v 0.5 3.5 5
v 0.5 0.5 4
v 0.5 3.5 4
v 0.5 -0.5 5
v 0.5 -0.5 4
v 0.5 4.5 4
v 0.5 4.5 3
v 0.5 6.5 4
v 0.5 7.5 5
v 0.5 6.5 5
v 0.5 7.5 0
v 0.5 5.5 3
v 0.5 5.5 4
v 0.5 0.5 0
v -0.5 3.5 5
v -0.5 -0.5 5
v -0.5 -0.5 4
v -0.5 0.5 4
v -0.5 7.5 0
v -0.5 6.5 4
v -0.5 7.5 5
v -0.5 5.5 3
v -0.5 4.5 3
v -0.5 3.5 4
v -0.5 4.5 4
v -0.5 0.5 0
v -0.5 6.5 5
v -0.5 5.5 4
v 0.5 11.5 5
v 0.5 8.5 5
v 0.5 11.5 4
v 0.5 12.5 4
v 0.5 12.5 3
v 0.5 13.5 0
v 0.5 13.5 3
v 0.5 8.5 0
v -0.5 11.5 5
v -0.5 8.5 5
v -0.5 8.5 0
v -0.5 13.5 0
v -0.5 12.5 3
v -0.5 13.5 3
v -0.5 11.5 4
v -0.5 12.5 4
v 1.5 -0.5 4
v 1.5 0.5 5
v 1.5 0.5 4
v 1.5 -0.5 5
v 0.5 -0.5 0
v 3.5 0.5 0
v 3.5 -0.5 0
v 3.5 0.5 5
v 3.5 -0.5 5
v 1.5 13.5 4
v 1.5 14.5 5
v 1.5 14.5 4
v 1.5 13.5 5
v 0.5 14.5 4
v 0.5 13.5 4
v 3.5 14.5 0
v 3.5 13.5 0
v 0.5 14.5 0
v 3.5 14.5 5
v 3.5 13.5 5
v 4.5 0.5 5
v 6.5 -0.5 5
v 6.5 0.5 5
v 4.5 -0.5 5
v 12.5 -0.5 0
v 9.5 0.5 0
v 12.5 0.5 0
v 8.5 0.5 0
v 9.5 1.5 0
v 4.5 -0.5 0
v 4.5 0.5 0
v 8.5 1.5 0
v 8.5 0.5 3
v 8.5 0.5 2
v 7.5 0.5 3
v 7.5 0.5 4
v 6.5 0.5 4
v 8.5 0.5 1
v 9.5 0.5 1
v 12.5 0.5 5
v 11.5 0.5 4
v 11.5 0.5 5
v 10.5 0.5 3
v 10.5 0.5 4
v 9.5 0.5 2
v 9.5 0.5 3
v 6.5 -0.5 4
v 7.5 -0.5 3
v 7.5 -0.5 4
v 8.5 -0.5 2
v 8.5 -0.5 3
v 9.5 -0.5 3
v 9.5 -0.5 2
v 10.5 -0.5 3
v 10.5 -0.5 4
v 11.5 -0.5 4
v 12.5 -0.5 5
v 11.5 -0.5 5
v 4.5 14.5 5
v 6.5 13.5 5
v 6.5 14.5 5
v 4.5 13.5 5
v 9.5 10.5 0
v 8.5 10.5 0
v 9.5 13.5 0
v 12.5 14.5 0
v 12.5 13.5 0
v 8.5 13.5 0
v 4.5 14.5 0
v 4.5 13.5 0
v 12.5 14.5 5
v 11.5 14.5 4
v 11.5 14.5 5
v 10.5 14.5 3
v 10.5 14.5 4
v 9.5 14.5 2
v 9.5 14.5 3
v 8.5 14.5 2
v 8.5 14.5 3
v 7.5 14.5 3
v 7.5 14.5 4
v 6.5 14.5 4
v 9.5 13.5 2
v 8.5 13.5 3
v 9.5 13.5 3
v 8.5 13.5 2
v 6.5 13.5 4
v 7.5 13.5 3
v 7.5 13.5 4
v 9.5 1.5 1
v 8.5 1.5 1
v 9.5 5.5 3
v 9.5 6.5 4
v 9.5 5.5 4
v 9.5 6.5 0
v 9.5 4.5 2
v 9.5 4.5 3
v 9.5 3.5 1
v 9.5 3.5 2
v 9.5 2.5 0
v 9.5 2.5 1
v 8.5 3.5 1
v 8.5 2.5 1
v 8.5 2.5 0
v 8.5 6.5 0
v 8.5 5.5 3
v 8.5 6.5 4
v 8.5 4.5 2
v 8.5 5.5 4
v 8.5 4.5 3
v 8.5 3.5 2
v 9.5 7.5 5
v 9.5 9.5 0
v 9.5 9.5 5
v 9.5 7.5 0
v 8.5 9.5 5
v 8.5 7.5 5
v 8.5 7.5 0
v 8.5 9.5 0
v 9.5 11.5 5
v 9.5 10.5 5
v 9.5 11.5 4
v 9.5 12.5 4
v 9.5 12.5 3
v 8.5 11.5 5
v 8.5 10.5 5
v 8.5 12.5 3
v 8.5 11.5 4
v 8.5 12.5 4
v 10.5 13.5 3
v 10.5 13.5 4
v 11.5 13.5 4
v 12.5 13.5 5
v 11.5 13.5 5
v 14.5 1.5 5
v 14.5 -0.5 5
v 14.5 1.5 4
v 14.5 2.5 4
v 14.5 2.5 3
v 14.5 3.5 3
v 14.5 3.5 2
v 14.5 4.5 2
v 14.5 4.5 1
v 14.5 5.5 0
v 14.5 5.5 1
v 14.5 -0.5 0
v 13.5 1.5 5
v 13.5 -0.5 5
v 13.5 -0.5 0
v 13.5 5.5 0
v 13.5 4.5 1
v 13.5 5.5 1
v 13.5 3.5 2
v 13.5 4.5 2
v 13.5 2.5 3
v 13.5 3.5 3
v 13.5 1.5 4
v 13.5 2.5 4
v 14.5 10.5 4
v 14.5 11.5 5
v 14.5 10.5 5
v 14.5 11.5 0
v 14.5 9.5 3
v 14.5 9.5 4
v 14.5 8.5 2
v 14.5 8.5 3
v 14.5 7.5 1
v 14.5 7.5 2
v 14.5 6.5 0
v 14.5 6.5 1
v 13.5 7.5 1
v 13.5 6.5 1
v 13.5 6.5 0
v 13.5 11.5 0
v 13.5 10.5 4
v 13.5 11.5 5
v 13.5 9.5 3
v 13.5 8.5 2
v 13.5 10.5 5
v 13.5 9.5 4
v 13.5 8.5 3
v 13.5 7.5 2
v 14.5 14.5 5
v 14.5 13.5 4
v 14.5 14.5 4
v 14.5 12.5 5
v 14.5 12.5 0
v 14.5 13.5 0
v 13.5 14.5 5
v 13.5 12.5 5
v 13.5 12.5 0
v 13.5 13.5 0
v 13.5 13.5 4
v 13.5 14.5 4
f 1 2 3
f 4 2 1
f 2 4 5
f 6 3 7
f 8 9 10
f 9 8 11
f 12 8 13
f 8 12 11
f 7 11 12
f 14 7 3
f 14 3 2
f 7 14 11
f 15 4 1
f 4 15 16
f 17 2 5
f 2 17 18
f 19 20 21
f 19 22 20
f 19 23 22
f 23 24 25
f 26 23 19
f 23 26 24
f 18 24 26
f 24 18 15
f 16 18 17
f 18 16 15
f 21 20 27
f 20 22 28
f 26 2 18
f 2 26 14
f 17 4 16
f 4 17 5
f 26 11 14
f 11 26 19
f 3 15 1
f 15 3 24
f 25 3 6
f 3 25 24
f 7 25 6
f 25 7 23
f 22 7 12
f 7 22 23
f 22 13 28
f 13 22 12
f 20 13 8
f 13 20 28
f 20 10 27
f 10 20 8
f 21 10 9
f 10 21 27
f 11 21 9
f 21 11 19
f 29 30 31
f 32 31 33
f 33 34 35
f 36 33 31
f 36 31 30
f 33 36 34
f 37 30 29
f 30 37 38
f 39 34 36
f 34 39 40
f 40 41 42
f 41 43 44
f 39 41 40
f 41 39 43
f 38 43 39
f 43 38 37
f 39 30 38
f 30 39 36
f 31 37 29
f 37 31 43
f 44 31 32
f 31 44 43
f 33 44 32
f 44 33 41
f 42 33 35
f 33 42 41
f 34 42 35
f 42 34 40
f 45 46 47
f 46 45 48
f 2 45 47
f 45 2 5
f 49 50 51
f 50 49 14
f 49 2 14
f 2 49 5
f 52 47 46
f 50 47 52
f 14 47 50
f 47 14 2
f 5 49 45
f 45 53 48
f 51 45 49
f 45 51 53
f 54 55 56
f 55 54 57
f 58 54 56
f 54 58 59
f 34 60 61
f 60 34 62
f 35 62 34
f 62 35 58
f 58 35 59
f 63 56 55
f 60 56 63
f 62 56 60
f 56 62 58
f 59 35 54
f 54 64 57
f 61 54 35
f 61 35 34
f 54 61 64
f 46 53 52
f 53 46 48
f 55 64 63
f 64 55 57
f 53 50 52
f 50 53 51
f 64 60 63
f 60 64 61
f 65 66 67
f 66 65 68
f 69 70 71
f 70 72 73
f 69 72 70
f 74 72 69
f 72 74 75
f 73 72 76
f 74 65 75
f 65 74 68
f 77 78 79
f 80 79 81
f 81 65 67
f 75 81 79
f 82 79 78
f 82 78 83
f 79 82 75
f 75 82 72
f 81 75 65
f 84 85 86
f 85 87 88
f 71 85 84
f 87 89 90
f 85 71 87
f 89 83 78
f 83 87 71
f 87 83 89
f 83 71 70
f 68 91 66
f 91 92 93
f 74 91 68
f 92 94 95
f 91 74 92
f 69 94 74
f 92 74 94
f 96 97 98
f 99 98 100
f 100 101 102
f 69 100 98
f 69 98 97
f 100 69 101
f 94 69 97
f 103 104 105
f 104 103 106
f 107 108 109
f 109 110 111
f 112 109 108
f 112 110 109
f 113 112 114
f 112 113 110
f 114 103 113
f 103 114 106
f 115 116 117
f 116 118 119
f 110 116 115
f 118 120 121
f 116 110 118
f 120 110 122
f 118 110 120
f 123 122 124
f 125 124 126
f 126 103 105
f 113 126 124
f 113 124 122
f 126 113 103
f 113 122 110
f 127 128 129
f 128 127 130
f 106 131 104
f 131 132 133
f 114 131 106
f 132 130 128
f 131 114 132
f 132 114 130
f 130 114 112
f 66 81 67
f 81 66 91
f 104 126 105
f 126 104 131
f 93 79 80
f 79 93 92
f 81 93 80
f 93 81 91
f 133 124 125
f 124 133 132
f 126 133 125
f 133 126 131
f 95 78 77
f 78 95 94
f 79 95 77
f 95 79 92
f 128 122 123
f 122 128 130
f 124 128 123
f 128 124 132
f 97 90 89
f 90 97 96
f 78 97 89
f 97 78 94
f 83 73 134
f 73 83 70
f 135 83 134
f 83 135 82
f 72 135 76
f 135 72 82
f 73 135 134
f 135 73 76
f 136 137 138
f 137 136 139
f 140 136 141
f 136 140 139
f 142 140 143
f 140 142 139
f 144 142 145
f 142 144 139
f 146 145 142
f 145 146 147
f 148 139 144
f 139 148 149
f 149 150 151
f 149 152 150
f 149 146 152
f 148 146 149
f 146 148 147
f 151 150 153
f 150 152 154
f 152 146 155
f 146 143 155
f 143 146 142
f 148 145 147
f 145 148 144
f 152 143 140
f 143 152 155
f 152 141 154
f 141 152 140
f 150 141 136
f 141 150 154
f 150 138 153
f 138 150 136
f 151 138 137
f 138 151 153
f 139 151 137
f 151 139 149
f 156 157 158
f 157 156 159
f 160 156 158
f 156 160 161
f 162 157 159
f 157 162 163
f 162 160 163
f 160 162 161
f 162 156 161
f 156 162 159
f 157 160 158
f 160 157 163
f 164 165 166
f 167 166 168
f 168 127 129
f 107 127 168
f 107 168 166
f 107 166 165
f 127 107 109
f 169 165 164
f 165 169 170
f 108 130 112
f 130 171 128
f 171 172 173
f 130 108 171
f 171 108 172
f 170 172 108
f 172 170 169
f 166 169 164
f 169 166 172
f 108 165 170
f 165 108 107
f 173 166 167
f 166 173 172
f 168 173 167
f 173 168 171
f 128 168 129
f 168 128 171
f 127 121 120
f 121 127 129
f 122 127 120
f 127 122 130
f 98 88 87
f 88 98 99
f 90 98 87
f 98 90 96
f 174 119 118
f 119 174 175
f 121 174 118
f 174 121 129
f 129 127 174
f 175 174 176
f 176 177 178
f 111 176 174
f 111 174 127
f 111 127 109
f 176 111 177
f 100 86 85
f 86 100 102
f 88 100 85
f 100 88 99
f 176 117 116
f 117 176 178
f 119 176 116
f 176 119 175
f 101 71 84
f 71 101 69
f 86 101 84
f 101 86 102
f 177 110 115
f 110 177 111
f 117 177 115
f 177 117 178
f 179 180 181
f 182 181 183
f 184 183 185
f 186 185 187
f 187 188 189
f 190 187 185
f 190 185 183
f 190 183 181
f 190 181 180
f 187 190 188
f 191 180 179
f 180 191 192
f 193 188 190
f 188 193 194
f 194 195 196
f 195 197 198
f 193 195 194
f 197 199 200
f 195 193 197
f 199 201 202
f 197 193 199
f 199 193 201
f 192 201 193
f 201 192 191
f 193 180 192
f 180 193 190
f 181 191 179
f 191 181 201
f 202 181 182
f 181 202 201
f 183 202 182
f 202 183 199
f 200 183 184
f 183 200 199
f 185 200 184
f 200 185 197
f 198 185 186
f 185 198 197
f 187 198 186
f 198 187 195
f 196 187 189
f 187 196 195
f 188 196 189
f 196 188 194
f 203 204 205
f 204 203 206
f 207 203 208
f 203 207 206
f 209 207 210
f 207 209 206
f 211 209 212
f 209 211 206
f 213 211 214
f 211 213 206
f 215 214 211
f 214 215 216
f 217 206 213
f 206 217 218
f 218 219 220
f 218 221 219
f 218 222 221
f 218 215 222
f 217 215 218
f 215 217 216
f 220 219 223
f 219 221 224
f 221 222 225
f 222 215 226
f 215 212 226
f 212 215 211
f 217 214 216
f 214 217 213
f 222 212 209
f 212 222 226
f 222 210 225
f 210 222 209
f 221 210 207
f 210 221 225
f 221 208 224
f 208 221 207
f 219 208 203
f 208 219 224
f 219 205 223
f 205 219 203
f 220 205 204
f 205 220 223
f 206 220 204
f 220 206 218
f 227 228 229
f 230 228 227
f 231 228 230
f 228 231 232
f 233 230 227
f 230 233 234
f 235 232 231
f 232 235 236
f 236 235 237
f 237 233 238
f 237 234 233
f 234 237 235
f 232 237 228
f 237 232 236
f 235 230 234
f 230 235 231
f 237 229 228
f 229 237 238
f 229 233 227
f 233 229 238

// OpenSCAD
union() {
    translate([0, 0, 4.5]) color([1, 0, 0]) cube([1, 1, 1], center=true);
    translate([0, 1, 2.5]) cube([1, 1, 5], center=true);
    translate([0, 2, 2.5]) cube([1, 1, 5], center=true);
    translate([0, 3, 2.5]) cube([1, 1, 5], center=true);
    translate([0, 4, 2.0]) cube([1, 1, 4], center=true);
    translate([0, 5, 1.5]) cube([1, 1, 3], center=true);
    translate([0, 6, 2.0]) cube([1, 1, 4], center=true);
    translate([0, 7, 2.5]) cube([1, 1, 5], center=true);
    translate([0, 9, 2.5]) cube([1, 1, 5], center=true);
    translate([0, 10, 2.5]) cube([1, 1, 5], center=true);
    translate([0, 11, 2.5]) cube([1, 1, 5], center=true);
    translate([0, 12, 2.0]) cube([1, 1, 4], center=true);
    translate([0, 13, 1.5]) cube([1, 1, 3], center=true);
    translate([1, 0, 2.0]) cube([1, 1, 4], center=true);
    translate([1, 14, 2.0]) cube([1, 1, 4], center=true);
    translate([2, 0, 2.5]) cube([1, 1, 5], center=true);
    translate([2, 14, 2.5]) cube([1, 1, 5], center=true);
    translate([3, 0, 2.5]) cube([1, 1, 5], center=true);
    translate([3, 14, 2.5]) cube([1, 1, 5], center=true);
    translate([5, 0, 2.5]) cube([1, 1, 5], center=true);
    translate([5, 14, 2.5]) cube([1, 1, 5], center=true);
    translate([6, 0, 2.5]) cube([1, 1, 5], center=true);
    translate([6, 14, 2.5]) cube([1, 1, 5], center=true);
    translate([7, 0, 2.0]) cube([1, 1, 4], center=true);
    translate([7, 14, 2.0]) cube([1, 1, 4], center=true);
    translate([8, 0, 1.5]) cube([1, 1, 3], center=true);
    translate([8, 14, 1.5]) cube([1, 1, 3], center=true);
    translate([9, 0, 1.0]) cube([1, 1, 2], center=true);
    translate([9, 1, 0.5]) cube([1, 1, 1], center=true);
    translate([9, 3, 0.5]) cube([1, 1, 1], center=true);
    translate([9, 4, 1.0]) cube([1, 1, 2], center=true);
    translate([9, 5, 1.5]) cube([1, 1, 3], center=true);
    translate([9, 6, 2.0]) cube([1, 1, 4], center=true);
    translate([9, 8, 2.5]) cube([1, 1, 5], center=true);
    translate([9, 9, 2.5]) cube([1, 1, 5], center=true);
    translate([9, 11, 2.5]) cube([1, 1, 5], center=true);
    translate([9, 12, 2.0]) cube([1, 1, 4], center=true);
    translate([9, 13, 1.5]) cube([1, 1, 3], center=true);
    translate([9, 14, 1.0]) cube([1, 1, 2], center=true);
    translate([10, 0, 1.5]) cube([1, 1, 3], center=true);
    translate([10, 14, 1.5]) cube([1, 1, 3], center=true);
    translate([11, 0, 2.0]) cube([1, 1, 4], center=true);
    translate([11, 14, 2.0]) cube([1, 1, 4], center=true);
    translate([12, 0, 2.5]) cube([1, 1, 5], center=true);
    translate([12, 14, 2.5]) cube([1, 1, 5], center=true);
    translate([14, 0, 2.5]) cube([1, 1, 5], center=true);
    translate([14, 1, 2.5]) cube([1, 1, 5], center=true);
    translate([14, 2, 2.0]) cube([1, 1, 4], center=true);
    translate([14, 3, 1.5]) cube([1, 1, 3], center=true);
    translate([14, 4, 1.0]) cube([1, 1, 2], center=true);
    translate([14, 5, 0.5]) cube([1, 1, 1], center=true);
    translate([14, 7, 0.5]) cube([1, 1, 1], center=true);
    translate([14, 8, 1.0]) cube([1, 1, 2], center=true);
    translate([14, 9, 1.5]) cube([1, 1, 3], center=true);
    translate([14, 10, 2.0]) cube([1, 1, 4], center=true);
    translate([14, 11, 2.5]) cube([1, 1, 5], center=true);
    translate([14, 13, 2.5]) cube([1, 1, 5], center=true);
    translate([14, 14, 4.5]) color([0, 0, 1]) cube([1, 1, 1], center=true);
}
